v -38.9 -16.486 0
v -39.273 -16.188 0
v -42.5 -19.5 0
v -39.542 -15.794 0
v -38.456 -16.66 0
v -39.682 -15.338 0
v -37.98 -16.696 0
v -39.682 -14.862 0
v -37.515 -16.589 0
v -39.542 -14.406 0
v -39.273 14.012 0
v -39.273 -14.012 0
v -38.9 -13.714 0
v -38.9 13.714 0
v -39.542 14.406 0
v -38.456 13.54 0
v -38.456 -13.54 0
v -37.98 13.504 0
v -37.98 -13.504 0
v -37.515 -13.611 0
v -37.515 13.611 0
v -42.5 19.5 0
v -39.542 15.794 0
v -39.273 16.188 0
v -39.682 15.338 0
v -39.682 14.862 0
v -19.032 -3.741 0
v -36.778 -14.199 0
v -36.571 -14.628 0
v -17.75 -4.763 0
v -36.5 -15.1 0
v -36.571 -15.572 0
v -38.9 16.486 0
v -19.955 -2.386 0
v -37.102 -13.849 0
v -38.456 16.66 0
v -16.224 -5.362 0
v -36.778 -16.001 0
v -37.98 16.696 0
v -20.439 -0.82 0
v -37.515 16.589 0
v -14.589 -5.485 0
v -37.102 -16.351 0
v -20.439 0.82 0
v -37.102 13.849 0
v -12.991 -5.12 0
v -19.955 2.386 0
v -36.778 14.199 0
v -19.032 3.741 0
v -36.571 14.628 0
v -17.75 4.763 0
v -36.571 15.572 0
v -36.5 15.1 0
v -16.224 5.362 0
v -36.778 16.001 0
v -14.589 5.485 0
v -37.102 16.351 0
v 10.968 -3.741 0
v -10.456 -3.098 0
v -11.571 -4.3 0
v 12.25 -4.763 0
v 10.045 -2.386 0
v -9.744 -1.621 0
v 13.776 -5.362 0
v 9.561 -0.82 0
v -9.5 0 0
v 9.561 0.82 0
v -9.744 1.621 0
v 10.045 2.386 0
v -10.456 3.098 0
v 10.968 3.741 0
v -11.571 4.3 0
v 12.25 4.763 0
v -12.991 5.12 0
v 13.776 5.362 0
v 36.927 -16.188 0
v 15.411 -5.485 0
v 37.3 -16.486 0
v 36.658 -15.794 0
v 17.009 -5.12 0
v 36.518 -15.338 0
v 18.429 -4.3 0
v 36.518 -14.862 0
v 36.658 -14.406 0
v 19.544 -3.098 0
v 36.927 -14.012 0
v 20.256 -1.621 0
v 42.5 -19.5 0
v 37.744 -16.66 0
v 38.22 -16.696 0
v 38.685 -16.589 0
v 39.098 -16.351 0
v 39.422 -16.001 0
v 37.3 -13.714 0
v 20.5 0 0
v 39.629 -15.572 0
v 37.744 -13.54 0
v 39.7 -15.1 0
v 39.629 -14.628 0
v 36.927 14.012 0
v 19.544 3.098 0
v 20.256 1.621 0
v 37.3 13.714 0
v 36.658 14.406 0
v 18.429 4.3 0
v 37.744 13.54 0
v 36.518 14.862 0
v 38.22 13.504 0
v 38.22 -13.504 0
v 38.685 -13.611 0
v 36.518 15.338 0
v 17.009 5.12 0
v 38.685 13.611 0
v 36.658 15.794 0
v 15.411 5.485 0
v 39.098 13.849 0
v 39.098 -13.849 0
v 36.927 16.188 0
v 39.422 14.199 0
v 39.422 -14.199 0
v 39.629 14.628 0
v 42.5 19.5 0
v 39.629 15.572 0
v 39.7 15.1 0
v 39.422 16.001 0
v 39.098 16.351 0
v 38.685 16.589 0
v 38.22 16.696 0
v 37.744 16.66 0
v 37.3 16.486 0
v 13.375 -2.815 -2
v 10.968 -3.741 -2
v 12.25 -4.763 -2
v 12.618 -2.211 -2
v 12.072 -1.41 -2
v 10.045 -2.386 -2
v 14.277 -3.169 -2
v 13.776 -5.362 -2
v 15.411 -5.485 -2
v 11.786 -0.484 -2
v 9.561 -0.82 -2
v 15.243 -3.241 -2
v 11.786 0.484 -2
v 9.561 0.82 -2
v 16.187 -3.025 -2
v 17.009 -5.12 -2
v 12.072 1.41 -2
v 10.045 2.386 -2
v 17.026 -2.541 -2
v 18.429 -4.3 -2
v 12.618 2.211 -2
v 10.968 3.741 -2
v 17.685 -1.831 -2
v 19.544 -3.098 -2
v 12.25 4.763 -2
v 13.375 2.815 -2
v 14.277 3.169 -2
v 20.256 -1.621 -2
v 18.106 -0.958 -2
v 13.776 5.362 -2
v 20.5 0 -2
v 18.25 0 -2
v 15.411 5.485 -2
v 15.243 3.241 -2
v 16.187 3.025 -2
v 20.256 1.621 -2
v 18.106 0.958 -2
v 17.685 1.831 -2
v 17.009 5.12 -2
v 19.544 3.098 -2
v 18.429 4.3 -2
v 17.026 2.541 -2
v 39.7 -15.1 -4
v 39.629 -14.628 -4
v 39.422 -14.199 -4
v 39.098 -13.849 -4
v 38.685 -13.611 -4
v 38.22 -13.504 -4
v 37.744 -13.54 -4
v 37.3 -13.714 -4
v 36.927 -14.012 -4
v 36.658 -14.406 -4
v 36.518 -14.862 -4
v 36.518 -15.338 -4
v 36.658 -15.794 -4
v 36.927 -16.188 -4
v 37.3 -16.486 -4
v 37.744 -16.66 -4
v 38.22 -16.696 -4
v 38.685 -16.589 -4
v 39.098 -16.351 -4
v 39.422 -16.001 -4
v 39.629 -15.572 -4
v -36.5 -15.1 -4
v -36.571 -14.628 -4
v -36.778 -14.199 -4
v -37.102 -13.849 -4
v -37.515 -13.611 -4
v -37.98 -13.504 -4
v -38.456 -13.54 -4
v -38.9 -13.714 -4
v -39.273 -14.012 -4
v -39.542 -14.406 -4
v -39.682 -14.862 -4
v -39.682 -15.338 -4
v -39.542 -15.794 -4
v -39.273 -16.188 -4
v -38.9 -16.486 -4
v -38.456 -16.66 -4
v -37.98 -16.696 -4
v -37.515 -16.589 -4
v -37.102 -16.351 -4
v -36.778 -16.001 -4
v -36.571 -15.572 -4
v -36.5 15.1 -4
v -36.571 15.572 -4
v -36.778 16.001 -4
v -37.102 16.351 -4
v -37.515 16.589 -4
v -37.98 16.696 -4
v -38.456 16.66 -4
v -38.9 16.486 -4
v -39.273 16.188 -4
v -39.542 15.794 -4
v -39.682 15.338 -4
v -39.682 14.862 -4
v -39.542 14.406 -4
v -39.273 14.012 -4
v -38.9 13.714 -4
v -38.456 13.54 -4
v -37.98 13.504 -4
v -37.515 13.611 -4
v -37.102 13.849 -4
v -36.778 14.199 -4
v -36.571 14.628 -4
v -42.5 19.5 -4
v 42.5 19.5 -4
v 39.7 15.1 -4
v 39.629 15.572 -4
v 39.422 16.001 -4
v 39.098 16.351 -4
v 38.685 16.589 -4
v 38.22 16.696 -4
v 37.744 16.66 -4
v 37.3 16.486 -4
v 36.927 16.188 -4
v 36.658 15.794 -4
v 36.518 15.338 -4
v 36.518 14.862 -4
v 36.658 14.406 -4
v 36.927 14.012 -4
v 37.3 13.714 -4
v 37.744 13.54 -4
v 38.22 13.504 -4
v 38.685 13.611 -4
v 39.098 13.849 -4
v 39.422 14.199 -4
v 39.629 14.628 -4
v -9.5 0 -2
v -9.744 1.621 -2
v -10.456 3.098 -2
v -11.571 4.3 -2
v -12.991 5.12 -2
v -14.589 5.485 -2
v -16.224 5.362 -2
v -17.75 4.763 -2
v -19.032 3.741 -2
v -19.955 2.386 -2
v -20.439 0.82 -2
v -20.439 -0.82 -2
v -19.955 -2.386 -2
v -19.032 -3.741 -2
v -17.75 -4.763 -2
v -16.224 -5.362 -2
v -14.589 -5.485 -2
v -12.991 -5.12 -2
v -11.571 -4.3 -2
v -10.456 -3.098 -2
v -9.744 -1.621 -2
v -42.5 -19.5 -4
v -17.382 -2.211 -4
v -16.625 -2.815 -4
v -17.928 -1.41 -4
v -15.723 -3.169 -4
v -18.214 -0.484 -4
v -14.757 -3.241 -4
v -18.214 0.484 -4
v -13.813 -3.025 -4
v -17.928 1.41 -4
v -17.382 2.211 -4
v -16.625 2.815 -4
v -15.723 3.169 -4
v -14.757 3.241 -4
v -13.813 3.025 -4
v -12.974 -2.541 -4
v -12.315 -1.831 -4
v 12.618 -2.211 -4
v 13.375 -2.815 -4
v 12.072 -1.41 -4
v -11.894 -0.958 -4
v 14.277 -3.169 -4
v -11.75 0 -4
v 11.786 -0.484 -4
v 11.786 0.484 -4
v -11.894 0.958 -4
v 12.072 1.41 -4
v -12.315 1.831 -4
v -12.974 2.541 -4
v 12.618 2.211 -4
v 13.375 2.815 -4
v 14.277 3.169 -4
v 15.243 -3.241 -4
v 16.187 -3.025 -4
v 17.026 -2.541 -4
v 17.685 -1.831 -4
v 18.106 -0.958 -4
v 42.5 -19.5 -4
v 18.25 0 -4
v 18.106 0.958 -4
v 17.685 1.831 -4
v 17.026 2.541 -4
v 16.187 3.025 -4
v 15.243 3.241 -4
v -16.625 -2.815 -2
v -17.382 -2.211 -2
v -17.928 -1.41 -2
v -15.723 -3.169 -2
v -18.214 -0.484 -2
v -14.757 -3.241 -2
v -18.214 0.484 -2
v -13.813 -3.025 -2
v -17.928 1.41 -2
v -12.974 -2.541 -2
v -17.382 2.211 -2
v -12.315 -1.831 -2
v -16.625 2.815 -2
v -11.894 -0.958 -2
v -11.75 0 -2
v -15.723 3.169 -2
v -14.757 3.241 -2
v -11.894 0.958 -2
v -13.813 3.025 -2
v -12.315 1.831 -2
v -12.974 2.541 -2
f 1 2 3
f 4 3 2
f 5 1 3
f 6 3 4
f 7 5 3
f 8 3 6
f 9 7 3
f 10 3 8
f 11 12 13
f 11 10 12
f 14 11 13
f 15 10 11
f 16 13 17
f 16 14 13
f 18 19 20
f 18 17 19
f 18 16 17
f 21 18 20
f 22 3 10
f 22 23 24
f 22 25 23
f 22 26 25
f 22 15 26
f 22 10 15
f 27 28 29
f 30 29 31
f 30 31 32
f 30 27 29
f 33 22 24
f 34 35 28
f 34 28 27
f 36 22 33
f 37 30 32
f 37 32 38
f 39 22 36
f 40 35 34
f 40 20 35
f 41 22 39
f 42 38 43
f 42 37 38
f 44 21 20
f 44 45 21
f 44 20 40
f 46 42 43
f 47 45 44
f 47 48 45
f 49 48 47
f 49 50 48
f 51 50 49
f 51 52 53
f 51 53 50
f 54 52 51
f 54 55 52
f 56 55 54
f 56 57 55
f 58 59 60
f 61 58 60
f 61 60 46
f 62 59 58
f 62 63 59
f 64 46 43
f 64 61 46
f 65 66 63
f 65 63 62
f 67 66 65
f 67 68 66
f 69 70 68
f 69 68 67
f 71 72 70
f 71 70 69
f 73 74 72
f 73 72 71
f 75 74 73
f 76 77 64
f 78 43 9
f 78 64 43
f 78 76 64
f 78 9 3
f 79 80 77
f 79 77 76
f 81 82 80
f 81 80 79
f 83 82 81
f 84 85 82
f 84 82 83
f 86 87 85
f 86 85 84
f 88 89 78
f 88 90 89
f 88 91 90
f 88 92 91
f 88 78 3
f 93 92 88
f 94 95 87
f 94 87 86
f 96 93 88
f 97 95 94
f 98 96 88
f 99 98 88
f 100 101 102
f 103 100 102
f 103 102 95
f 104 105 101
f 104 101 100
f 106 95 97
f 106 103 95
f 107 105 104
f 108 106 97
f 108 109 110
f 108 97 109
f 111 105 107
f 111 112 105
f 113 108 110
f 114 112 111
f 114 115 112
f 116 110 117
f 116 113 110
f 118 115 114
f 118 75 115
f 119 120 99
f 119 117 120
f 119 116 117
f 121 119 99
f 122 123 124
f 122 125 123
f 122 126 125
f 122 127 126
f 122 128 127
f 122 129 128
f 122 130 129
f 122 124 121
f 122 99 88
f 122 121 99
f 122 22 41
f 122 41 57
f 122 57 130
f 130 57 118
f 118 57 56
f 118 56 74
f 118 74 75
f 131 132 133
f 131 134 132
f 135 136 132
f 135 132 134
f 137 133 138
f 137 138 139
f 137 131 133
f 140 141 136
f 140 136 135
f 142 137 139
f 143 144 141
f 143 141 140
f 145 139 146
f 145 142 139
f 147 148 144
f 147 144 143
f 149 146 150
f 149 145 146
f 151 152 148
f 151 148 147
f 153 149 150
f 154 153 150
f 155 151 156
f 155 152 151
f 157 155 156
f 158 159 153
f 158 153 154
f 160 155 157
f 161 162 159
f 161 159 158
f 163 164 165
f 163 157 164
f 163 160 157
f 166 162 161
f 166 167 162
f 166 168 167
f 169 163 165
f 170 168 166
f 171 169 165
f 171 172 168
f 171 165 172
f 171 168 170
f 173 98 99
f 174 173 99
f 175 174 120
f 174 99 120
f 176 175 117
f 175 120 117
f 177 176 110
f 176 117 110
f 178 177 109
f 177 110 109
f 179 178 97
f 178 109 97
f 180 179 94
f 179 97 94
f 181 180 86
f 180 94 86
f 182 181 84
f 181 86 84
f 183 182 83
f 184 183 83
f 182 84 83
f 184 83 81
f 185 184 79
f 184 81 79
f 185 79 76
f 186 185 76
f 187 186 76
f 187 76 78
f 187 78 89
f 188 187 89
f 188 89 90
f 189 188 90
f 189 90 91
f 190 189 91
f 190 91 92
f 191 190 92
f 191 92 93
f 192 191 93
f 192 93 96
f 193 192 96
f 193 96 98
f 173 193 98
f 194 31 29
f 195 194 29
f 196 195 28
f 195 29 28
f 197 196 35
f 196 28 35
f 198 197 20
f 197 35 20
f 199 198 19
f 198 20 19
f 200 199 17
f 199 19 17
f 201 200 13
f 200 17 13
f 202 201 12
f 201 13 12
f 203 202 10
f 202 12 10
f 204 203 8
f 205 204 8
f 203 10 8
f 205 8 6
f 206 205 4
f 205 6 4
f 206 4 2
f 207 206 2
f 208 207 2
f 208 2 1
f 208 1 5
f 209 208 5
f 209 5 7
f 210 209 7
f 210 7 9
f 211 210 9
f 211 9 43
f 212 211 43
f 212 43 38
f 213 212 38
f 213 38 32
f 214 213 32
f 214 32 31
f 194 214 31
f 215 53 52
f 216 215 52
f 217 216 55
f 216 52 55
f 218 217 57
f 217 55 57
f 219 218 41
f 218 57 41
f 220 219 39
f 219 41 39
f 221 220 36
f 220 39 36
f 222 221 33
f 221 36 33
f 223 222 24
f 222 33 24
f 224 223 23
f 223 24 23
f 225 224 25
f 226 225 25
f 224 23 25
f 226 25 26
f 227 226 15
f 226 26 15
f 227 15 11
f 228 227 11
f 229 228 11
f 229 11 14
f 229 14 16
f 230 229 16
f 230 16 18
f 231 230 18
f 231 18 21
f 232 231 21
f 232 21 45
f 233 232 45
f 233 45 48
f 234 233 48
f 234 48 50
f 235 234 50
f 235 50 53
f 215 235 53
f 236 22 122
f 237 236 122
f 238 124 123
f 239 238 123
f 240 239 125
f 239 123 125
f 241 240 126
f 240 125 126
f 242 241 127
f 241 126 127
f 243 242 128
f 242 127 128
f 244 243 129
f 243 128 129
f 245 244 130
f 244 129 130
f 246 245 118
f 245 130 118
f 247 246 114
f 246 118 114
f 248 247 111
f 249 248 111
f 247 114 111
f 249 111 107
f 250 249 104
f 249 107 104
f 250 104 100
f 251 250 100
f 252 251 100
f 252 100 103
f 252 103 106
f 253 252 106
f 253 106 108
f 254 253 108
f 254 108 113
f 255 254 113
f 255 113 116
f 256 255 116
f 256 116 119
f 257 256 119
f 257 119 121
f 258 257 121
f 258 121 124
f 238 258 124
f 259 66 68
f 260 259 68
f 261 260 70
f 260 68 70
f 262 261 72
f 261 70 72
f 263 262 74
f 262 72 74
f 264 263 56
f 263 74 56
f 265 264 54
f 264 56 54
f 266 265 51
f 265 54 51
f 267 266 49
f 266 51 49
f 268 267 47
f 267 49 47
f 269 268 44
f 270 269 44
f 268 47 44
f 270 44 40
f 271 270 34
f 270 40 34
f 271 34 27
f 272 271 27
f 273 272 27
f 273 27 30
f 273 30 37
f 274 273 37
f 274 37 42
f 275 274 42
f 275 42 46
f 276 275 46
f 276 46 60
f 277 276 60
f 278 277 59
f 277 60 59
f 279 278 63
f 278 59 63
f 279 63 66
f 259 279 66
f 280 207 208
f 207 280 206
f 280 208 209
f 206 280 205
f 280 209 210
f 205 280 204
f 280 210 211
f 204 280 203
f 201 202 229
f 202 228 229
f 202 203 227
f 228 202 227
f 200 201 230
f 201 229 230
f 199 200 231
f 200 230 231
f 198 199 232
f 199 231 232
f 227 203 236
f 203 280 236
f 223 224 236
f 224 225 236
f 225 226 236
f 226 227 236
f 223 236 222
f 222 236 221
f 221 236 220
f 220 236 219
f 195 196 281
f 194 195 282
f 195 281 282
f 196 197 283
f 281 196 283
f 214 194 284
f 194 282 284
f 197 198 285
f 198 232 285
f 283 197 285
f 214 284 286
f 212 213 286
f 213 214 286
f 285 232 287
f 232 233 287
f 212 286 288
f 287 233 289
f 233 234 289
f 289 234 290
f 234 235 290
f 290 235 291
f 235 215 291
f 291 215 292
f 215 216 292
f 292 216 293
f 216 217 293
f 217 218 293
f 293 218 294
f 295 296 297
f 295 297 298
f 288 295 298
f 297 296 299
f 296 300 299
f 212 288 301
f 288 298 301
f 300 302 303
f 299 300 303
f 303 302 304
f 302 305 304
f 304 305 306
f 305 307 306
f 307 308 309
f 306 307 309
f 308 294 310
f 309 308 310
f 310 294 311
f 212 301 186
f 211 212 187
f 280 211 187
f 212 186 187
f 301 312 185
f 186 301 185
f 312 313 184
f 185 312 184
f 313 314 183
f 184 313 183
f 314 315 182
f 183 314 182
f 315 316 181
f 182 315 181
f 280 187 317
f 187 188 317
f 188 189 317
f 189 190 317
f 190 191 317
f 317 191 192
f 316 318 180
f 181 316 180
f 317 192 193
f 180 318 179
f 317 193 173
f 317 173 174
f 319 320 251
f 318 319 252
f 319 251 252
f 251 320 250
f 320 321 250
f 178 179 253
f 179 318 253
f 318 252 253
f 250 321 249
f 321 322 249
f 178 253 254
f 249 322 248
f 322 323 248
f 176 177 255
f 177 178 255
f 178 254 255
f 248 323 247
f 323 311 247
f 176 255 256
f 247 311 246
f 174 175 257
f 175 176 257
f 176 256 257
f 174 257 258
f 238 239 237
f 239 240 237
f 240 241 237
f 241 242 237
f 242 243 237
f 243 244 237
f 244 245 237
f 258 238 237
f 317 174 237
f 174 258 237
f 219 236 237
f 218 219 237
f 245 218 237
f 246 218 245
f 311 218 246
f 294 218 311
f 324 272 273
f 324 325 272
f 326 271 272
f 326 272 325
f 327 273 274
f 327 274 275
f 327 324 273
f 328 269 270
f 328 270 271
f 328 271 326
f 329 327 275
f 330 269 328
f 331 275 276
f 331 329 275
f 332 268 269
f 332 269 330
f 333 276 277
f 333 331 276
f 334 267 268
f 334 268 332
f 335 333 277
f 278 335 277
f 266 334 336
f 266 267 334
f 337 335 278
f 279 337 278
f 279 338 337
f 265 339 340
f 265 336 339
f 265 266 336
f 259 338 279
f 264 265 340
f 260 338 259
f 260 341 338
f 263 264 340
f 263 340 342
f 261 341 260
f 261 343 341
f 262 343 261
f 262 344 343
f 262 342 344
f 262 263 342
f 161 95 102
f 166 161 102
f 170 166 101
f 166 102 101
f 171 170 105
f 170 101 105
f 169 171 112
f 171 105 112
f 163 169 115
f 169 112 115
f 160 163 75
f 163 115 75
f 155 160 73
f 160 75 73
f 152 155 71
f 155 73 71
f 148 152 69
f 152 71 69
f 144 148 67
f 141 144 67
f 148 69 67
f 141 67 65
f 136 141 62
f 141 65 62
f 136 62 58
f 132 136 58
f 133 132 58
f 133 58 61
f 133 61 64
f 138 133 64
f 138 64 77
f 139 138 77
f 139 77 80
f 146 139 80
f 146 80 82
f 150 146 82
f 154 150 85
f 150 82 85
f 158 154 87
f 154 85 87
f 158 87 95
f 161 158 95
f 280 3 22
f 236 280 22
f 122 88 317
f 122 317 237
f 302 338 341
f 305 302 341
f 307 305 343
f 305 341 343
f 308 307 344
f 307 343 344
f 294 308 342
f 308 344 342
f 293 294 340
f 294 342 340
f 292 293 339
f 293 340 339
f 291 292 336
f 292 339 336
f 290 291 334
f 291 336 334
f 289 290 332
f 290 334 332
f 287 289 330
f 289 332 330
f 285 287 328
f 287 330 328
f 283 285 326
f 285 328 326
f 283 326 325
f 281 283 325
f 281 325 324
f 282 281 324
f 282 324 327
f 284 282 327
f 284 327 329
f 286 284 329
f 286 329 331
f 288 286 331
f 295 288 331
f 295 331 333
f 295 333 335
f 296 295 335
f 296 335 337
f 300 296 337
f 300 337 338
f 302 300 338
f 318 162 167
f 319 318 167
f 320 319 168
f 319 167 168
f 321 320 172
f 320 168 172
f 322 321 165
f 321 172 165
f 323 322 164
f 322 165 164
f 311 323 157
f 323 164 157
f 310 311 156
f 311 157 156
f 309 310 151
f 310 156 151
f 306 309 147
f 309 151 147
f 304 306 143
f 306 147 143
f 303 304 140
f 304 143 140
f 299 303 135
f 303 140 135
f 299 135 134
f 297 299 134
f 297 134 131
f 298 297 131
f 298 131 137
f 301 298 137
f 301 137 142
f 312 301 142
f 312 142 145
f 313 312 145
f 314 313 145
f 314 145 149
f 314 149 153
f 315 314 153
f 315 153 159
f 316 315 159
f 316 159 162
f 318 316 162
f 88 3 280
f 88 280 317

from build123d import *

# Parameters (mm, degrees)
SKETCH003_W     = 85
SKETCH003_H     = 39
PAD001_DEPTH    = 4
SKETCH007_R     = 1.6
SKETCH007_R_2   = 3.25
POCKET003_DEPTH = 5
SKETCH008_R     = 5.5
POCKET004_DEPTH = 2


with BuildPart() as part:
    # Sketch003 → Pad001 (new body)
    with BuildSketch(Plane.XY):
        Rectangle(SKETCH003_W, SKETCH003_H)
    extrude(amount=-PAD001_DEPTH)

    # Sketch007 → Pocket003 (cut)
    with BuildSketch(Plane.XY):
        with Locations((-38.1, 15.1)):
            Circle(SKETCH007_R)
        with Locations((-38.1, -15.1)):
            Circle(SKETCH007_R)
        with Locations((38.1, -15.1)):
            Circle(SKETCH007_R)
        with Locations((38.1, 15.1)):
            Circle(SKETCH007_R)
        with Locations((-15, 0)):
            Circle(SKETCH007_R_2)
        with Locations((15, 0)):
            Circle(SKETCH007_R_2)
    extrude(amount=-POCKET003_DEPTH, mode=Mode.SUBTRACT)

    # Sketch008 → Pocket004 (cut)
    with BuildSketch(Plane.XY):
        with Locations((-15, 0)):
            Circle(SKETCH008_R)
        with Locations((15, 0)):
            Circle(SKETCH008_R)
    extrude(amount=-POCKET004_DEPTH, mode=Mode.SUBTRACT)


solid = part.part
